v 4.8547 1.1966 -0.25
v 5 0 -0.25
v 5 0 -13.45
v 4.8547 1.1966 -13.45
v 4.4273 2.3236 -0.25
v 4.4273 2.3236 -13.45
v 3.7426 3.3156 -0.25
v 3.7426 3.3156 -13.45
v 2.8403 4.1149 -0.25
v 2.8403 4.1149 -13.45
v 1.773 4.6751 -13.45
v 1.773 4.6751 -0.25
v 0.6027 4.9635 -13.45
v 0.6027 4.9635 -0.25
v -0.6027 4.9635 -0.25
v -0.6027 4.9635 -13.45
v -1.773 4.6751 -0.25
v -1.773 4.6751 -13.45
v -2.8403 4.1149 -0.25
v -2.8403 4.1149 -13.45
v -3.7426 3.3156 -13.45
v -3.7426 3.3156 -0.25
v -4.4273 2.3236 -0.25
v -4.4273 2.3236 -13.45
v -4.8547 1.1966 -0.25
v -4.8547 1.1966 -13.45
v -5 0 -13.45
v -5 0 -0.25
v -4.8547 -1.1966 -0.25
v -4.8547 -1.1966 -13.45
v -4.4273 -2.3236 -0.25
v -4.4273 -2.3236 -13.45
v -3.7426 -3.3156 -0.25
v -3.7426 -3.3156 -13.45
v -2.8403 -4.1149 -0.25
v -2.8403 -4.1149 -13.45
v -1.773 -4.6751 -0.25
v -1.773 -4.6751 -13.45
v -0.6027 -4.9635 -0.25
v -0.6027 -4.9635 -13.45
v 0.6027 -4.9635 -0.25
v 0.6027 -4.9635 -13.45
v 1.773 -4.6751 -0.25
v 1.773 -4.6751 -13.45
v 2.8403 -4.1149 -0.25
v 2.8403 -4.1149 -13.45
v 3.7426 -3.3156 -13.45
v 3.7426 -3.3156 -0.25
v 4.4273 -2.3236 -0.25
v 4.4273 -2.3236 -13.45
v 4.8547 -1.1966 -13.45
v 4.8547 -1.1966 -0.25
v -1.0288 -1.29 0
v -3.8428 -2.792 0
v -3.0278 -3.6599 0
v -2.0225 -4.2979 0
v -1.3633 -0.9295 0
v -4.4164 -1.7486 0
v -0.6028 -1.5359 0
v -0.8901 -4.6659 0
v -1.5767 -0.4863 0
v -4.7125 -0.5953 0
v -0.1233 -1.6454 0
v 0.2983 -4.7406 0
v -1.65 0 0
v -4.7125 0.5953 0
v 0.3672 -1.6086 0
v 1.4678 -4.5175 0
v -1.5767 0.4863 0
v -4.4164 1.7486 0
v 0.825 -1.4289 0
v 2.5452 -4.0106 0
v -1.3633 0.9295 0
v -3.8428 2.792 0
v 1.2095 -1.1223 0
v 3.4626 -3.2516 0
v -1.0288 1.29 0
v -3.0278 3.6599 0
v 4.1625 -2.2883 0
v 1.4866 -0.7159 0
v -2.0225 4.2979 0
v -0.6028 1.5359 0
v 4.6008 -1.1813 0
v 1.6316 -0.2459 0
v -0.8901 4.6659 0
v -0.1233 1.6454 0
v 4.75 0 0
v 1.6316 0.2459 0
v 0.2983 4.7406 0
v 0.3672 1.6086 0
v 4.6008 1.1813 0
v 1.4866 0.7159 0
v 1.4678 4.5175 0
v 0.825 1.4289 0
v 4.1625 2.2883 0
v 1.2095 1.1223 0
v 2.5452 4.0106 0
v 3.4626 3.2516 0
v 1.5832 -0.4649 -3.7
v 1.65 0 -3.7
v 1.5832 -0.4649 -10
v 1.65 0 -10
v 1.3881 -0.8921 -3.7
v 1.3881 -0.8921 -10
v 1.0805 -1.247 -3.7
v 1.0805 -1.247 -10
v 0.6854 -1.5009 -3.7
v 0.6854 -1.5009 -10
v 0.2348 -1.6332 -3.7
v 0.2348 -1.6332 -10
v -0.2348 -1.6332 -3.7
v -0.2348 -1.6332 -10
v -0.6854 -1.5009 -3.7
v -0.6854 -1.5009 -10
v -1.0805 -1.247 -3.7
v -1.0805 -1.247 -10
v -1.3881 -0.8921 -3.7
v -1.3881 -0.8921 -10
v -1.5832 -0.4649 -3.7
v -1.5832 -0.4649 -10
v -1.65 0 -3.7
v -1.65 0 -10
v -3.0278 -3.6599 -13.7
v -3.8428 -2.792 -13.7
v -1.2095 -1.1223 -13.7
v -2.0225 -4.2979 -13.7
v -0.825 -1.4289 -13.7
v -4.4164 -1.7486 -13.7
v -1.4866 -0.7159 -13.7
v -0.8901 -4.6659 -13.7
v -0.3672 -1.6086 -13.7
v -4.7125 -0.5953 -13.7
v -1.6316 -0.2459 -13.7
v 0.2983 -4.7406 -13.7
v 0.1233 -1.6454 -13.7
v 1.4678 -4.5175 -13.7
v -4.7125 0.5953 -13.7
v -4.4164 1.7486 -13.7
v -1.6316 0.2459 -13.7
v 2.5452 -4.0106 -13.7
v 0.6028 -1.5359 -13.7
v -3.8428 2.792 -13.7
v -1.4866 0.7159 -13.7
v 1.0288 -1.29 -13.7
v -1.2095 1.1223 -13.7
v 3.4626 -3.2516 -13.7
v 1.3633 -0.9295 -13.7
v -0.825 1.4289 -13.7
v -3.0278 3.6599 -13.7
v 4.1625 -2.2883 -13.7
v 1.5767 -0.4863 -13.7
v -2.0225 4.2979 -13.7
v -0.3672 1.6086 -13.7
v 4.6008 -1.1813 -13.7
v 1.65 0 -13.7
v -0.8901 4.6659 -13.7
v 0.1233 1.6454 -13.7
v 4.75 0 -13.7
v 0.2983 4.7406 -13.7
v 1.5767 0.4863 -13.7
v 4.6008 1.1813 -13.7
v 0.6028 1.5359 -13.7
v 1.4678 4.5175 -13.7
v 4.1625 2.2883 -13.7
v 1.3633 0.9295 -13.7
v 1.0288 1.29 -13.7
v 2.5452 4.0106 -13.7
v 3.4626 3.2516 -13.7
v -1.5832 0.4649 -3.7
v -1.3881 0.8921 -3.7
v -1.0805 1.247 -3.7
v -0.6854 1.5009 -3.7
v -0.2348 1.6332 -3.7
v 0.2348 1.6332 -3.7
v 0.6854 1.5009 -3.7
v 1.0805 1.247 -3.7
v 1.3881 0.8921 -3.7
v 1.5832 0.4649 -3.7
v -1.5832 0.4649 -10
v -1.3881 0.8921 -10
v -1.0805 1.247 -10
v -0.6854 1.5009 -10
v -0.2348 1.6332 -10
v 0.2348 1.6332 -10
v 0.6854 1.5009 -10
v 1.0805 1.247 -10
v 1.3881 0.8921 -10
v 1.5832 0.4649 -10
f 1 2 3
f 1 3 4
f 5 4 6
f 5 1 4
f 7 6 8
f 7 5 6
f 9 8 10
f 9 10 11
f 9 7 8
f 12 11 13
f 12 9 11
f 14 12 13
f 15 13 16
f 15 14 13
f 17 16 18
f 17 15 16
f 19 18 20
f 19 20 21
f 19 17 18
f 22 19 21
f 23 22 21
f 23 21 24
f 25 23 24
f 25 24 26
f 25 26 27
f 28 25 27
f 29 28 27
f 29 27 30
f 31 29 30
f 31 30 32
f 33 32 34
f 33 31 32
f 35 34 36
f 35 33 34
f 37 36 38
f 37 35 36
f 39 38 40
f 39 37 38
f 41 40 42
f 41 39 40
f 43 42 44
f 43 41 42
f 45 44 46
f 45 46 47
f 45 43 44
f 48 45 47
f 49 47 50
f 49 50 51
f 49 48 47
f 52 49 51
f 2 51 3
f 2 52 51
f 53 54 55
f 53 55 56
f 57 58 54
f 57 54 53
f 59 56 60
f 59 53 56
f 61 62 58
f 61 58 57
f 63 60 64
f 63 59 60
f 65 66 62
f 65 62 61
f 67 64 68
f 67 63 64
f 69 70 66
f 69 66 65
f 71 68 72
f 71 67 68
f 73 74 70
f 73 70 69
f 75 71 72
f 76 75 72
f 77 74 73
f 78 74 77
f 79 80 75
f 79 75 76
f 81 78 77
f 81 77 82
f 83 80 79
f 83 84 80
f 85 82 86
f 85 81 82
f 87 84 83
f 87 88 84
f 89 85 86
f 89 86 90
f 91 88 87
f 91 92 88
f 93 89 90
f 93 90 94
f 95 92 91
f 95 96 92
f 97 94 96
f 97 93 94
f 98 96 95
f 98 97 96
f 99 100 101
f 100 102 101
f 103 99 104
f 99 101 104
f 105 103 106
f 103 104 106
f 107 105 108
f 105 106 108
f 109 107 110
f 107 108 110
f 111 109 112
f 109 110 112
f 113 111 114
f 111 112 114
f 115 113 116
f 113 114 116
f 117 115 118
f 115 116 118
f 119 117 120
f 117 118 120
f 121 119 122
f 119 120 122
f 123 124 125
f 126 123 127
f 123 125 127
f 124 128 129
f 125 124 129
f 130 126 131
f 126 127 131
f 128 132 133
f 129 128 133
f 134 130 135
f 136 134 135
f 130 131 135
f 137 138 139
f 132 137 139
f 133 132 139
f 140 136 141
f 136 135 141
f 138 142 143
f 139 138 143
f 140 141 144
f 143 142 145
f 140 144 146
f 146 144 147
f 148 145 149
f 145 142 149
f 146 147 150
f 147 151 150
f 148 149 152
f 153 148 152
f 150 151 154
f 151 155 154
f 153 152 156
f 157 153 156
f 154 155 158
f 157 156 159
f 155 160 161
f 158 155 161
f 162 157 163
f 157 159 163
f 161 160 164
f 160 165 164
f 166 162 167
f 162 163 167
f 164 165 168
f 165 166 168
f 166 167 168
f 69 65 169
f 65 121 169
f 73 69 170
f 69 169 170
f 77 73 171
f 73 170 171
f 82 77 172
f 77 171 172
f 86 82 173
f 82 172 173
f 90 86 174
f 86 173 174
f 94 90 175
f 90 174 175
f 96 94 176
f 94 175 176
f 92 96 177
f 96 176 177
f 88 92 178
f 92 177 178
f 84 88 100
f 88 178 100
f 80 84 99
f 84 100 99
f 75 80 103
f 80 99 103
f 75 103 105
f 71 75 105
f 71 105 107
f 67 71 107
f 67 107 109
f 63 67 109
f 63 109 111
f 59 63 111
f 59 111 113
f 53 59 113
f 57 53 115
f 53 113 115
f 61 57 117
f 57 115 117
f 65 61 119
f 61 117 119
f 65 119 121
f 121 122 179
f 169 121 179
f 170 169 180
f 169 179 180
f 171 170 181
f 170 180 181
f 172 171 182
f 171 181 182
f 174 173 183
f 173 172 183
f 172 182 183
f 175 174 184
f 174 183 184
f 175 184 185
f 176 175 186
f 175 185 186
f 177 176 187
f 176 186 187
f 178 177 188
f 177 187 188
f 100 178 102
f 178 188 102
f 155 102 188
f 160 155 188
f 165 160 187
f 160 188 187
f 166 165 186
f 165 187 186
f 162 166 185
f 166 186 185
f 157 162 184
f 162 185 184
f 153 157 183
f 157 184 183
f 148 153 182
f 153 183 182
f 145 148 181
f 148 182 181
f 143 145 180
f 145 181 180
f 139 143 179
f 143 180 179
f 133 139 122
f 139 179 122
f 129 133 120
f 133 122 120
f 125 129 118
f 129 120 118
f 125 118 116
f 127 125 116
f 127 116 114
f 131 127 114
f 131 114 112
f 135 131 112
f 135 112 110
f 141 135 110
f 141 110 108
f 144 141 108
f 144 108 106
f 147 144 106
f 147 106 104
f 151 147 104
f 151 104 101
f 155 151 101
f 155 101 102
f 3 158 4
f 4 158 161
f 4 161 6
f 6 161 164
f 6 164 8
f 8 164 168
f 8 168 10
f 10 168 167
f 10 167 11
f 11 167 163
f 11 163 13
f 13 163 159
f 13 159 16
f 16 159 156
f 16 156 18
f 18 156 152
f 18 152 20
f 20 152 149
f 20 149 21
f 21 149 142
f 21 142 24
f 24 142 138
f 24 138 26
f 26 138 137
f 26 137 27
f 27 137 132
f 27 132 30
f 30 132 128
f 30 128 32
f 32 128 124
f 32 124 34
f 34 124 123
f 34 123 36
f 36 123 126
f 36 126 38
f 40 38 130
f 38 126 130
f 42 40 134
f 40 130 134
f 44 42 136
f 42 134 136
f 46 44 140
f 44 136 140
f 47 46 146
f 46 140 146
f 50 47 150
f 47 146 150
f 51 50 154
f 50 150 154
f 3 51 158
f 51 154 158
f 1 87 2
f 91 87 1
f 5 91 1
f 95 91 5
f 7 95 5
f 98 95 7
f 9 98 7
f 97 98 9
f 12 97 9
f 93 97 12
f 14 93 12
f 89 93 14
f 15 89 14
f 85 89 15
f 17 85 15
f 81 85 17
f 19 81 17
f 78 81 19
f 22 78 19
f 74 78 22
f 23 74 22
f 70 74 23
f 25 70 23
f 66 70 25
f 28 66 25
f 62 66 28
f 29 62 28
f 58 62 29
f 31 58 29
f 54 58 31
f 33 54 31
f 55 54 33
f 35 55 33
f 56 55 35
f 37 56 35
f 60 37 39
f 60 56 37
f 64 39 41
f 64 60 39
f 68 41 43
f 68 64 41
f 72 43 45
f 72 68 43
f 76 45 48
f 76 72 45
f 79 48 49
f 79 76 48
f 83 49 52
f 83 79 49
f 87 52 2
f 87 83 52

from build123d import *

# Parameters (mm, degrees)
SKETCH1_R                 = 5
EXTRUDE1_DEPTH            = 13.7
M4X0_7_TAPPED_HOLE1_D     = 3.3
M4X0_7_TAPPED_HOLE1_DEPTH = 10
M4X0_7_TAPPED_HOLE1_TIP   = 0.991420021
M4X0_7_TAPPED_HOLE2_D     = 3.3
M4X0_7_TAPPED_HOLE2_DEPTH = 10
M4X0_7_TAPPED_HOLE2_TIP   = 0.991420021
CHAMFER1_SIZE             = 0.25


with BuildPart() as part:
    # Sketch1 → Extrude1 (new body)
    with BuildSketch(Plane.XY):
        Circle(SKETCH1_R)
    extrude(amount=-EXTRUDE1_DEPTH)

    # M4x0.7 Tapped Hole1
    with Locations(Plane.XY):
        with Locations((0, 0)):
            Hole(M4X0_7_TAPPED_HOLE1_D / 2, depth=M4X0_7_TAPPED_HOLE1_DEPTH)
            with Locations((0, 0, -(M4X0_7_TAPPED_HOLE1_DEPTH + M4X0_7_TAPPED_HOLE1_TIP / 2))):  # 118° drill point
                Cone(0, M4X0_7_TAPPED_HOLE1_D / 2, M4X0_7_TAPPED_HOLE1_TIP, mode=Mode.SUBTRACT)

    # M4x0.7 Tapped Hole2
    with Locations(Plane(origin=(0, 0, -13.7), x_dir=(-1, 0, 0), z_dir=(0, 0, -1))):
        with Locations((0, 0)):
            Hole(M4X0_7_TAPPED_HOLE2_D / 2, depth=M4X0_7_TAPPED_HOLE2_DEPTH)
            with Locations((0, 0, -(M4X0_7_TAPPED_HOLE2_DEPTH + M4X0_7_TAPPED_HOLE2_TIP / 2))):  # 118° drill point
                Cone(0, M4X0_7_TAPPED_HOLE2_D / 2, M4X0_7_TAPPED_HOLE2_TIP, mode=Mode.SUBTRACT)

    # Chamfer1
    chamfer1_edges = [part.edges().sort_by_distance(p)[0] for p in [
        (-5, 0, 0),
        (-5, 0, -13.7),
    ]]
    chamfer(chamfer1_edges, length=CHAMFER1_SIZE)


solid = part.part
